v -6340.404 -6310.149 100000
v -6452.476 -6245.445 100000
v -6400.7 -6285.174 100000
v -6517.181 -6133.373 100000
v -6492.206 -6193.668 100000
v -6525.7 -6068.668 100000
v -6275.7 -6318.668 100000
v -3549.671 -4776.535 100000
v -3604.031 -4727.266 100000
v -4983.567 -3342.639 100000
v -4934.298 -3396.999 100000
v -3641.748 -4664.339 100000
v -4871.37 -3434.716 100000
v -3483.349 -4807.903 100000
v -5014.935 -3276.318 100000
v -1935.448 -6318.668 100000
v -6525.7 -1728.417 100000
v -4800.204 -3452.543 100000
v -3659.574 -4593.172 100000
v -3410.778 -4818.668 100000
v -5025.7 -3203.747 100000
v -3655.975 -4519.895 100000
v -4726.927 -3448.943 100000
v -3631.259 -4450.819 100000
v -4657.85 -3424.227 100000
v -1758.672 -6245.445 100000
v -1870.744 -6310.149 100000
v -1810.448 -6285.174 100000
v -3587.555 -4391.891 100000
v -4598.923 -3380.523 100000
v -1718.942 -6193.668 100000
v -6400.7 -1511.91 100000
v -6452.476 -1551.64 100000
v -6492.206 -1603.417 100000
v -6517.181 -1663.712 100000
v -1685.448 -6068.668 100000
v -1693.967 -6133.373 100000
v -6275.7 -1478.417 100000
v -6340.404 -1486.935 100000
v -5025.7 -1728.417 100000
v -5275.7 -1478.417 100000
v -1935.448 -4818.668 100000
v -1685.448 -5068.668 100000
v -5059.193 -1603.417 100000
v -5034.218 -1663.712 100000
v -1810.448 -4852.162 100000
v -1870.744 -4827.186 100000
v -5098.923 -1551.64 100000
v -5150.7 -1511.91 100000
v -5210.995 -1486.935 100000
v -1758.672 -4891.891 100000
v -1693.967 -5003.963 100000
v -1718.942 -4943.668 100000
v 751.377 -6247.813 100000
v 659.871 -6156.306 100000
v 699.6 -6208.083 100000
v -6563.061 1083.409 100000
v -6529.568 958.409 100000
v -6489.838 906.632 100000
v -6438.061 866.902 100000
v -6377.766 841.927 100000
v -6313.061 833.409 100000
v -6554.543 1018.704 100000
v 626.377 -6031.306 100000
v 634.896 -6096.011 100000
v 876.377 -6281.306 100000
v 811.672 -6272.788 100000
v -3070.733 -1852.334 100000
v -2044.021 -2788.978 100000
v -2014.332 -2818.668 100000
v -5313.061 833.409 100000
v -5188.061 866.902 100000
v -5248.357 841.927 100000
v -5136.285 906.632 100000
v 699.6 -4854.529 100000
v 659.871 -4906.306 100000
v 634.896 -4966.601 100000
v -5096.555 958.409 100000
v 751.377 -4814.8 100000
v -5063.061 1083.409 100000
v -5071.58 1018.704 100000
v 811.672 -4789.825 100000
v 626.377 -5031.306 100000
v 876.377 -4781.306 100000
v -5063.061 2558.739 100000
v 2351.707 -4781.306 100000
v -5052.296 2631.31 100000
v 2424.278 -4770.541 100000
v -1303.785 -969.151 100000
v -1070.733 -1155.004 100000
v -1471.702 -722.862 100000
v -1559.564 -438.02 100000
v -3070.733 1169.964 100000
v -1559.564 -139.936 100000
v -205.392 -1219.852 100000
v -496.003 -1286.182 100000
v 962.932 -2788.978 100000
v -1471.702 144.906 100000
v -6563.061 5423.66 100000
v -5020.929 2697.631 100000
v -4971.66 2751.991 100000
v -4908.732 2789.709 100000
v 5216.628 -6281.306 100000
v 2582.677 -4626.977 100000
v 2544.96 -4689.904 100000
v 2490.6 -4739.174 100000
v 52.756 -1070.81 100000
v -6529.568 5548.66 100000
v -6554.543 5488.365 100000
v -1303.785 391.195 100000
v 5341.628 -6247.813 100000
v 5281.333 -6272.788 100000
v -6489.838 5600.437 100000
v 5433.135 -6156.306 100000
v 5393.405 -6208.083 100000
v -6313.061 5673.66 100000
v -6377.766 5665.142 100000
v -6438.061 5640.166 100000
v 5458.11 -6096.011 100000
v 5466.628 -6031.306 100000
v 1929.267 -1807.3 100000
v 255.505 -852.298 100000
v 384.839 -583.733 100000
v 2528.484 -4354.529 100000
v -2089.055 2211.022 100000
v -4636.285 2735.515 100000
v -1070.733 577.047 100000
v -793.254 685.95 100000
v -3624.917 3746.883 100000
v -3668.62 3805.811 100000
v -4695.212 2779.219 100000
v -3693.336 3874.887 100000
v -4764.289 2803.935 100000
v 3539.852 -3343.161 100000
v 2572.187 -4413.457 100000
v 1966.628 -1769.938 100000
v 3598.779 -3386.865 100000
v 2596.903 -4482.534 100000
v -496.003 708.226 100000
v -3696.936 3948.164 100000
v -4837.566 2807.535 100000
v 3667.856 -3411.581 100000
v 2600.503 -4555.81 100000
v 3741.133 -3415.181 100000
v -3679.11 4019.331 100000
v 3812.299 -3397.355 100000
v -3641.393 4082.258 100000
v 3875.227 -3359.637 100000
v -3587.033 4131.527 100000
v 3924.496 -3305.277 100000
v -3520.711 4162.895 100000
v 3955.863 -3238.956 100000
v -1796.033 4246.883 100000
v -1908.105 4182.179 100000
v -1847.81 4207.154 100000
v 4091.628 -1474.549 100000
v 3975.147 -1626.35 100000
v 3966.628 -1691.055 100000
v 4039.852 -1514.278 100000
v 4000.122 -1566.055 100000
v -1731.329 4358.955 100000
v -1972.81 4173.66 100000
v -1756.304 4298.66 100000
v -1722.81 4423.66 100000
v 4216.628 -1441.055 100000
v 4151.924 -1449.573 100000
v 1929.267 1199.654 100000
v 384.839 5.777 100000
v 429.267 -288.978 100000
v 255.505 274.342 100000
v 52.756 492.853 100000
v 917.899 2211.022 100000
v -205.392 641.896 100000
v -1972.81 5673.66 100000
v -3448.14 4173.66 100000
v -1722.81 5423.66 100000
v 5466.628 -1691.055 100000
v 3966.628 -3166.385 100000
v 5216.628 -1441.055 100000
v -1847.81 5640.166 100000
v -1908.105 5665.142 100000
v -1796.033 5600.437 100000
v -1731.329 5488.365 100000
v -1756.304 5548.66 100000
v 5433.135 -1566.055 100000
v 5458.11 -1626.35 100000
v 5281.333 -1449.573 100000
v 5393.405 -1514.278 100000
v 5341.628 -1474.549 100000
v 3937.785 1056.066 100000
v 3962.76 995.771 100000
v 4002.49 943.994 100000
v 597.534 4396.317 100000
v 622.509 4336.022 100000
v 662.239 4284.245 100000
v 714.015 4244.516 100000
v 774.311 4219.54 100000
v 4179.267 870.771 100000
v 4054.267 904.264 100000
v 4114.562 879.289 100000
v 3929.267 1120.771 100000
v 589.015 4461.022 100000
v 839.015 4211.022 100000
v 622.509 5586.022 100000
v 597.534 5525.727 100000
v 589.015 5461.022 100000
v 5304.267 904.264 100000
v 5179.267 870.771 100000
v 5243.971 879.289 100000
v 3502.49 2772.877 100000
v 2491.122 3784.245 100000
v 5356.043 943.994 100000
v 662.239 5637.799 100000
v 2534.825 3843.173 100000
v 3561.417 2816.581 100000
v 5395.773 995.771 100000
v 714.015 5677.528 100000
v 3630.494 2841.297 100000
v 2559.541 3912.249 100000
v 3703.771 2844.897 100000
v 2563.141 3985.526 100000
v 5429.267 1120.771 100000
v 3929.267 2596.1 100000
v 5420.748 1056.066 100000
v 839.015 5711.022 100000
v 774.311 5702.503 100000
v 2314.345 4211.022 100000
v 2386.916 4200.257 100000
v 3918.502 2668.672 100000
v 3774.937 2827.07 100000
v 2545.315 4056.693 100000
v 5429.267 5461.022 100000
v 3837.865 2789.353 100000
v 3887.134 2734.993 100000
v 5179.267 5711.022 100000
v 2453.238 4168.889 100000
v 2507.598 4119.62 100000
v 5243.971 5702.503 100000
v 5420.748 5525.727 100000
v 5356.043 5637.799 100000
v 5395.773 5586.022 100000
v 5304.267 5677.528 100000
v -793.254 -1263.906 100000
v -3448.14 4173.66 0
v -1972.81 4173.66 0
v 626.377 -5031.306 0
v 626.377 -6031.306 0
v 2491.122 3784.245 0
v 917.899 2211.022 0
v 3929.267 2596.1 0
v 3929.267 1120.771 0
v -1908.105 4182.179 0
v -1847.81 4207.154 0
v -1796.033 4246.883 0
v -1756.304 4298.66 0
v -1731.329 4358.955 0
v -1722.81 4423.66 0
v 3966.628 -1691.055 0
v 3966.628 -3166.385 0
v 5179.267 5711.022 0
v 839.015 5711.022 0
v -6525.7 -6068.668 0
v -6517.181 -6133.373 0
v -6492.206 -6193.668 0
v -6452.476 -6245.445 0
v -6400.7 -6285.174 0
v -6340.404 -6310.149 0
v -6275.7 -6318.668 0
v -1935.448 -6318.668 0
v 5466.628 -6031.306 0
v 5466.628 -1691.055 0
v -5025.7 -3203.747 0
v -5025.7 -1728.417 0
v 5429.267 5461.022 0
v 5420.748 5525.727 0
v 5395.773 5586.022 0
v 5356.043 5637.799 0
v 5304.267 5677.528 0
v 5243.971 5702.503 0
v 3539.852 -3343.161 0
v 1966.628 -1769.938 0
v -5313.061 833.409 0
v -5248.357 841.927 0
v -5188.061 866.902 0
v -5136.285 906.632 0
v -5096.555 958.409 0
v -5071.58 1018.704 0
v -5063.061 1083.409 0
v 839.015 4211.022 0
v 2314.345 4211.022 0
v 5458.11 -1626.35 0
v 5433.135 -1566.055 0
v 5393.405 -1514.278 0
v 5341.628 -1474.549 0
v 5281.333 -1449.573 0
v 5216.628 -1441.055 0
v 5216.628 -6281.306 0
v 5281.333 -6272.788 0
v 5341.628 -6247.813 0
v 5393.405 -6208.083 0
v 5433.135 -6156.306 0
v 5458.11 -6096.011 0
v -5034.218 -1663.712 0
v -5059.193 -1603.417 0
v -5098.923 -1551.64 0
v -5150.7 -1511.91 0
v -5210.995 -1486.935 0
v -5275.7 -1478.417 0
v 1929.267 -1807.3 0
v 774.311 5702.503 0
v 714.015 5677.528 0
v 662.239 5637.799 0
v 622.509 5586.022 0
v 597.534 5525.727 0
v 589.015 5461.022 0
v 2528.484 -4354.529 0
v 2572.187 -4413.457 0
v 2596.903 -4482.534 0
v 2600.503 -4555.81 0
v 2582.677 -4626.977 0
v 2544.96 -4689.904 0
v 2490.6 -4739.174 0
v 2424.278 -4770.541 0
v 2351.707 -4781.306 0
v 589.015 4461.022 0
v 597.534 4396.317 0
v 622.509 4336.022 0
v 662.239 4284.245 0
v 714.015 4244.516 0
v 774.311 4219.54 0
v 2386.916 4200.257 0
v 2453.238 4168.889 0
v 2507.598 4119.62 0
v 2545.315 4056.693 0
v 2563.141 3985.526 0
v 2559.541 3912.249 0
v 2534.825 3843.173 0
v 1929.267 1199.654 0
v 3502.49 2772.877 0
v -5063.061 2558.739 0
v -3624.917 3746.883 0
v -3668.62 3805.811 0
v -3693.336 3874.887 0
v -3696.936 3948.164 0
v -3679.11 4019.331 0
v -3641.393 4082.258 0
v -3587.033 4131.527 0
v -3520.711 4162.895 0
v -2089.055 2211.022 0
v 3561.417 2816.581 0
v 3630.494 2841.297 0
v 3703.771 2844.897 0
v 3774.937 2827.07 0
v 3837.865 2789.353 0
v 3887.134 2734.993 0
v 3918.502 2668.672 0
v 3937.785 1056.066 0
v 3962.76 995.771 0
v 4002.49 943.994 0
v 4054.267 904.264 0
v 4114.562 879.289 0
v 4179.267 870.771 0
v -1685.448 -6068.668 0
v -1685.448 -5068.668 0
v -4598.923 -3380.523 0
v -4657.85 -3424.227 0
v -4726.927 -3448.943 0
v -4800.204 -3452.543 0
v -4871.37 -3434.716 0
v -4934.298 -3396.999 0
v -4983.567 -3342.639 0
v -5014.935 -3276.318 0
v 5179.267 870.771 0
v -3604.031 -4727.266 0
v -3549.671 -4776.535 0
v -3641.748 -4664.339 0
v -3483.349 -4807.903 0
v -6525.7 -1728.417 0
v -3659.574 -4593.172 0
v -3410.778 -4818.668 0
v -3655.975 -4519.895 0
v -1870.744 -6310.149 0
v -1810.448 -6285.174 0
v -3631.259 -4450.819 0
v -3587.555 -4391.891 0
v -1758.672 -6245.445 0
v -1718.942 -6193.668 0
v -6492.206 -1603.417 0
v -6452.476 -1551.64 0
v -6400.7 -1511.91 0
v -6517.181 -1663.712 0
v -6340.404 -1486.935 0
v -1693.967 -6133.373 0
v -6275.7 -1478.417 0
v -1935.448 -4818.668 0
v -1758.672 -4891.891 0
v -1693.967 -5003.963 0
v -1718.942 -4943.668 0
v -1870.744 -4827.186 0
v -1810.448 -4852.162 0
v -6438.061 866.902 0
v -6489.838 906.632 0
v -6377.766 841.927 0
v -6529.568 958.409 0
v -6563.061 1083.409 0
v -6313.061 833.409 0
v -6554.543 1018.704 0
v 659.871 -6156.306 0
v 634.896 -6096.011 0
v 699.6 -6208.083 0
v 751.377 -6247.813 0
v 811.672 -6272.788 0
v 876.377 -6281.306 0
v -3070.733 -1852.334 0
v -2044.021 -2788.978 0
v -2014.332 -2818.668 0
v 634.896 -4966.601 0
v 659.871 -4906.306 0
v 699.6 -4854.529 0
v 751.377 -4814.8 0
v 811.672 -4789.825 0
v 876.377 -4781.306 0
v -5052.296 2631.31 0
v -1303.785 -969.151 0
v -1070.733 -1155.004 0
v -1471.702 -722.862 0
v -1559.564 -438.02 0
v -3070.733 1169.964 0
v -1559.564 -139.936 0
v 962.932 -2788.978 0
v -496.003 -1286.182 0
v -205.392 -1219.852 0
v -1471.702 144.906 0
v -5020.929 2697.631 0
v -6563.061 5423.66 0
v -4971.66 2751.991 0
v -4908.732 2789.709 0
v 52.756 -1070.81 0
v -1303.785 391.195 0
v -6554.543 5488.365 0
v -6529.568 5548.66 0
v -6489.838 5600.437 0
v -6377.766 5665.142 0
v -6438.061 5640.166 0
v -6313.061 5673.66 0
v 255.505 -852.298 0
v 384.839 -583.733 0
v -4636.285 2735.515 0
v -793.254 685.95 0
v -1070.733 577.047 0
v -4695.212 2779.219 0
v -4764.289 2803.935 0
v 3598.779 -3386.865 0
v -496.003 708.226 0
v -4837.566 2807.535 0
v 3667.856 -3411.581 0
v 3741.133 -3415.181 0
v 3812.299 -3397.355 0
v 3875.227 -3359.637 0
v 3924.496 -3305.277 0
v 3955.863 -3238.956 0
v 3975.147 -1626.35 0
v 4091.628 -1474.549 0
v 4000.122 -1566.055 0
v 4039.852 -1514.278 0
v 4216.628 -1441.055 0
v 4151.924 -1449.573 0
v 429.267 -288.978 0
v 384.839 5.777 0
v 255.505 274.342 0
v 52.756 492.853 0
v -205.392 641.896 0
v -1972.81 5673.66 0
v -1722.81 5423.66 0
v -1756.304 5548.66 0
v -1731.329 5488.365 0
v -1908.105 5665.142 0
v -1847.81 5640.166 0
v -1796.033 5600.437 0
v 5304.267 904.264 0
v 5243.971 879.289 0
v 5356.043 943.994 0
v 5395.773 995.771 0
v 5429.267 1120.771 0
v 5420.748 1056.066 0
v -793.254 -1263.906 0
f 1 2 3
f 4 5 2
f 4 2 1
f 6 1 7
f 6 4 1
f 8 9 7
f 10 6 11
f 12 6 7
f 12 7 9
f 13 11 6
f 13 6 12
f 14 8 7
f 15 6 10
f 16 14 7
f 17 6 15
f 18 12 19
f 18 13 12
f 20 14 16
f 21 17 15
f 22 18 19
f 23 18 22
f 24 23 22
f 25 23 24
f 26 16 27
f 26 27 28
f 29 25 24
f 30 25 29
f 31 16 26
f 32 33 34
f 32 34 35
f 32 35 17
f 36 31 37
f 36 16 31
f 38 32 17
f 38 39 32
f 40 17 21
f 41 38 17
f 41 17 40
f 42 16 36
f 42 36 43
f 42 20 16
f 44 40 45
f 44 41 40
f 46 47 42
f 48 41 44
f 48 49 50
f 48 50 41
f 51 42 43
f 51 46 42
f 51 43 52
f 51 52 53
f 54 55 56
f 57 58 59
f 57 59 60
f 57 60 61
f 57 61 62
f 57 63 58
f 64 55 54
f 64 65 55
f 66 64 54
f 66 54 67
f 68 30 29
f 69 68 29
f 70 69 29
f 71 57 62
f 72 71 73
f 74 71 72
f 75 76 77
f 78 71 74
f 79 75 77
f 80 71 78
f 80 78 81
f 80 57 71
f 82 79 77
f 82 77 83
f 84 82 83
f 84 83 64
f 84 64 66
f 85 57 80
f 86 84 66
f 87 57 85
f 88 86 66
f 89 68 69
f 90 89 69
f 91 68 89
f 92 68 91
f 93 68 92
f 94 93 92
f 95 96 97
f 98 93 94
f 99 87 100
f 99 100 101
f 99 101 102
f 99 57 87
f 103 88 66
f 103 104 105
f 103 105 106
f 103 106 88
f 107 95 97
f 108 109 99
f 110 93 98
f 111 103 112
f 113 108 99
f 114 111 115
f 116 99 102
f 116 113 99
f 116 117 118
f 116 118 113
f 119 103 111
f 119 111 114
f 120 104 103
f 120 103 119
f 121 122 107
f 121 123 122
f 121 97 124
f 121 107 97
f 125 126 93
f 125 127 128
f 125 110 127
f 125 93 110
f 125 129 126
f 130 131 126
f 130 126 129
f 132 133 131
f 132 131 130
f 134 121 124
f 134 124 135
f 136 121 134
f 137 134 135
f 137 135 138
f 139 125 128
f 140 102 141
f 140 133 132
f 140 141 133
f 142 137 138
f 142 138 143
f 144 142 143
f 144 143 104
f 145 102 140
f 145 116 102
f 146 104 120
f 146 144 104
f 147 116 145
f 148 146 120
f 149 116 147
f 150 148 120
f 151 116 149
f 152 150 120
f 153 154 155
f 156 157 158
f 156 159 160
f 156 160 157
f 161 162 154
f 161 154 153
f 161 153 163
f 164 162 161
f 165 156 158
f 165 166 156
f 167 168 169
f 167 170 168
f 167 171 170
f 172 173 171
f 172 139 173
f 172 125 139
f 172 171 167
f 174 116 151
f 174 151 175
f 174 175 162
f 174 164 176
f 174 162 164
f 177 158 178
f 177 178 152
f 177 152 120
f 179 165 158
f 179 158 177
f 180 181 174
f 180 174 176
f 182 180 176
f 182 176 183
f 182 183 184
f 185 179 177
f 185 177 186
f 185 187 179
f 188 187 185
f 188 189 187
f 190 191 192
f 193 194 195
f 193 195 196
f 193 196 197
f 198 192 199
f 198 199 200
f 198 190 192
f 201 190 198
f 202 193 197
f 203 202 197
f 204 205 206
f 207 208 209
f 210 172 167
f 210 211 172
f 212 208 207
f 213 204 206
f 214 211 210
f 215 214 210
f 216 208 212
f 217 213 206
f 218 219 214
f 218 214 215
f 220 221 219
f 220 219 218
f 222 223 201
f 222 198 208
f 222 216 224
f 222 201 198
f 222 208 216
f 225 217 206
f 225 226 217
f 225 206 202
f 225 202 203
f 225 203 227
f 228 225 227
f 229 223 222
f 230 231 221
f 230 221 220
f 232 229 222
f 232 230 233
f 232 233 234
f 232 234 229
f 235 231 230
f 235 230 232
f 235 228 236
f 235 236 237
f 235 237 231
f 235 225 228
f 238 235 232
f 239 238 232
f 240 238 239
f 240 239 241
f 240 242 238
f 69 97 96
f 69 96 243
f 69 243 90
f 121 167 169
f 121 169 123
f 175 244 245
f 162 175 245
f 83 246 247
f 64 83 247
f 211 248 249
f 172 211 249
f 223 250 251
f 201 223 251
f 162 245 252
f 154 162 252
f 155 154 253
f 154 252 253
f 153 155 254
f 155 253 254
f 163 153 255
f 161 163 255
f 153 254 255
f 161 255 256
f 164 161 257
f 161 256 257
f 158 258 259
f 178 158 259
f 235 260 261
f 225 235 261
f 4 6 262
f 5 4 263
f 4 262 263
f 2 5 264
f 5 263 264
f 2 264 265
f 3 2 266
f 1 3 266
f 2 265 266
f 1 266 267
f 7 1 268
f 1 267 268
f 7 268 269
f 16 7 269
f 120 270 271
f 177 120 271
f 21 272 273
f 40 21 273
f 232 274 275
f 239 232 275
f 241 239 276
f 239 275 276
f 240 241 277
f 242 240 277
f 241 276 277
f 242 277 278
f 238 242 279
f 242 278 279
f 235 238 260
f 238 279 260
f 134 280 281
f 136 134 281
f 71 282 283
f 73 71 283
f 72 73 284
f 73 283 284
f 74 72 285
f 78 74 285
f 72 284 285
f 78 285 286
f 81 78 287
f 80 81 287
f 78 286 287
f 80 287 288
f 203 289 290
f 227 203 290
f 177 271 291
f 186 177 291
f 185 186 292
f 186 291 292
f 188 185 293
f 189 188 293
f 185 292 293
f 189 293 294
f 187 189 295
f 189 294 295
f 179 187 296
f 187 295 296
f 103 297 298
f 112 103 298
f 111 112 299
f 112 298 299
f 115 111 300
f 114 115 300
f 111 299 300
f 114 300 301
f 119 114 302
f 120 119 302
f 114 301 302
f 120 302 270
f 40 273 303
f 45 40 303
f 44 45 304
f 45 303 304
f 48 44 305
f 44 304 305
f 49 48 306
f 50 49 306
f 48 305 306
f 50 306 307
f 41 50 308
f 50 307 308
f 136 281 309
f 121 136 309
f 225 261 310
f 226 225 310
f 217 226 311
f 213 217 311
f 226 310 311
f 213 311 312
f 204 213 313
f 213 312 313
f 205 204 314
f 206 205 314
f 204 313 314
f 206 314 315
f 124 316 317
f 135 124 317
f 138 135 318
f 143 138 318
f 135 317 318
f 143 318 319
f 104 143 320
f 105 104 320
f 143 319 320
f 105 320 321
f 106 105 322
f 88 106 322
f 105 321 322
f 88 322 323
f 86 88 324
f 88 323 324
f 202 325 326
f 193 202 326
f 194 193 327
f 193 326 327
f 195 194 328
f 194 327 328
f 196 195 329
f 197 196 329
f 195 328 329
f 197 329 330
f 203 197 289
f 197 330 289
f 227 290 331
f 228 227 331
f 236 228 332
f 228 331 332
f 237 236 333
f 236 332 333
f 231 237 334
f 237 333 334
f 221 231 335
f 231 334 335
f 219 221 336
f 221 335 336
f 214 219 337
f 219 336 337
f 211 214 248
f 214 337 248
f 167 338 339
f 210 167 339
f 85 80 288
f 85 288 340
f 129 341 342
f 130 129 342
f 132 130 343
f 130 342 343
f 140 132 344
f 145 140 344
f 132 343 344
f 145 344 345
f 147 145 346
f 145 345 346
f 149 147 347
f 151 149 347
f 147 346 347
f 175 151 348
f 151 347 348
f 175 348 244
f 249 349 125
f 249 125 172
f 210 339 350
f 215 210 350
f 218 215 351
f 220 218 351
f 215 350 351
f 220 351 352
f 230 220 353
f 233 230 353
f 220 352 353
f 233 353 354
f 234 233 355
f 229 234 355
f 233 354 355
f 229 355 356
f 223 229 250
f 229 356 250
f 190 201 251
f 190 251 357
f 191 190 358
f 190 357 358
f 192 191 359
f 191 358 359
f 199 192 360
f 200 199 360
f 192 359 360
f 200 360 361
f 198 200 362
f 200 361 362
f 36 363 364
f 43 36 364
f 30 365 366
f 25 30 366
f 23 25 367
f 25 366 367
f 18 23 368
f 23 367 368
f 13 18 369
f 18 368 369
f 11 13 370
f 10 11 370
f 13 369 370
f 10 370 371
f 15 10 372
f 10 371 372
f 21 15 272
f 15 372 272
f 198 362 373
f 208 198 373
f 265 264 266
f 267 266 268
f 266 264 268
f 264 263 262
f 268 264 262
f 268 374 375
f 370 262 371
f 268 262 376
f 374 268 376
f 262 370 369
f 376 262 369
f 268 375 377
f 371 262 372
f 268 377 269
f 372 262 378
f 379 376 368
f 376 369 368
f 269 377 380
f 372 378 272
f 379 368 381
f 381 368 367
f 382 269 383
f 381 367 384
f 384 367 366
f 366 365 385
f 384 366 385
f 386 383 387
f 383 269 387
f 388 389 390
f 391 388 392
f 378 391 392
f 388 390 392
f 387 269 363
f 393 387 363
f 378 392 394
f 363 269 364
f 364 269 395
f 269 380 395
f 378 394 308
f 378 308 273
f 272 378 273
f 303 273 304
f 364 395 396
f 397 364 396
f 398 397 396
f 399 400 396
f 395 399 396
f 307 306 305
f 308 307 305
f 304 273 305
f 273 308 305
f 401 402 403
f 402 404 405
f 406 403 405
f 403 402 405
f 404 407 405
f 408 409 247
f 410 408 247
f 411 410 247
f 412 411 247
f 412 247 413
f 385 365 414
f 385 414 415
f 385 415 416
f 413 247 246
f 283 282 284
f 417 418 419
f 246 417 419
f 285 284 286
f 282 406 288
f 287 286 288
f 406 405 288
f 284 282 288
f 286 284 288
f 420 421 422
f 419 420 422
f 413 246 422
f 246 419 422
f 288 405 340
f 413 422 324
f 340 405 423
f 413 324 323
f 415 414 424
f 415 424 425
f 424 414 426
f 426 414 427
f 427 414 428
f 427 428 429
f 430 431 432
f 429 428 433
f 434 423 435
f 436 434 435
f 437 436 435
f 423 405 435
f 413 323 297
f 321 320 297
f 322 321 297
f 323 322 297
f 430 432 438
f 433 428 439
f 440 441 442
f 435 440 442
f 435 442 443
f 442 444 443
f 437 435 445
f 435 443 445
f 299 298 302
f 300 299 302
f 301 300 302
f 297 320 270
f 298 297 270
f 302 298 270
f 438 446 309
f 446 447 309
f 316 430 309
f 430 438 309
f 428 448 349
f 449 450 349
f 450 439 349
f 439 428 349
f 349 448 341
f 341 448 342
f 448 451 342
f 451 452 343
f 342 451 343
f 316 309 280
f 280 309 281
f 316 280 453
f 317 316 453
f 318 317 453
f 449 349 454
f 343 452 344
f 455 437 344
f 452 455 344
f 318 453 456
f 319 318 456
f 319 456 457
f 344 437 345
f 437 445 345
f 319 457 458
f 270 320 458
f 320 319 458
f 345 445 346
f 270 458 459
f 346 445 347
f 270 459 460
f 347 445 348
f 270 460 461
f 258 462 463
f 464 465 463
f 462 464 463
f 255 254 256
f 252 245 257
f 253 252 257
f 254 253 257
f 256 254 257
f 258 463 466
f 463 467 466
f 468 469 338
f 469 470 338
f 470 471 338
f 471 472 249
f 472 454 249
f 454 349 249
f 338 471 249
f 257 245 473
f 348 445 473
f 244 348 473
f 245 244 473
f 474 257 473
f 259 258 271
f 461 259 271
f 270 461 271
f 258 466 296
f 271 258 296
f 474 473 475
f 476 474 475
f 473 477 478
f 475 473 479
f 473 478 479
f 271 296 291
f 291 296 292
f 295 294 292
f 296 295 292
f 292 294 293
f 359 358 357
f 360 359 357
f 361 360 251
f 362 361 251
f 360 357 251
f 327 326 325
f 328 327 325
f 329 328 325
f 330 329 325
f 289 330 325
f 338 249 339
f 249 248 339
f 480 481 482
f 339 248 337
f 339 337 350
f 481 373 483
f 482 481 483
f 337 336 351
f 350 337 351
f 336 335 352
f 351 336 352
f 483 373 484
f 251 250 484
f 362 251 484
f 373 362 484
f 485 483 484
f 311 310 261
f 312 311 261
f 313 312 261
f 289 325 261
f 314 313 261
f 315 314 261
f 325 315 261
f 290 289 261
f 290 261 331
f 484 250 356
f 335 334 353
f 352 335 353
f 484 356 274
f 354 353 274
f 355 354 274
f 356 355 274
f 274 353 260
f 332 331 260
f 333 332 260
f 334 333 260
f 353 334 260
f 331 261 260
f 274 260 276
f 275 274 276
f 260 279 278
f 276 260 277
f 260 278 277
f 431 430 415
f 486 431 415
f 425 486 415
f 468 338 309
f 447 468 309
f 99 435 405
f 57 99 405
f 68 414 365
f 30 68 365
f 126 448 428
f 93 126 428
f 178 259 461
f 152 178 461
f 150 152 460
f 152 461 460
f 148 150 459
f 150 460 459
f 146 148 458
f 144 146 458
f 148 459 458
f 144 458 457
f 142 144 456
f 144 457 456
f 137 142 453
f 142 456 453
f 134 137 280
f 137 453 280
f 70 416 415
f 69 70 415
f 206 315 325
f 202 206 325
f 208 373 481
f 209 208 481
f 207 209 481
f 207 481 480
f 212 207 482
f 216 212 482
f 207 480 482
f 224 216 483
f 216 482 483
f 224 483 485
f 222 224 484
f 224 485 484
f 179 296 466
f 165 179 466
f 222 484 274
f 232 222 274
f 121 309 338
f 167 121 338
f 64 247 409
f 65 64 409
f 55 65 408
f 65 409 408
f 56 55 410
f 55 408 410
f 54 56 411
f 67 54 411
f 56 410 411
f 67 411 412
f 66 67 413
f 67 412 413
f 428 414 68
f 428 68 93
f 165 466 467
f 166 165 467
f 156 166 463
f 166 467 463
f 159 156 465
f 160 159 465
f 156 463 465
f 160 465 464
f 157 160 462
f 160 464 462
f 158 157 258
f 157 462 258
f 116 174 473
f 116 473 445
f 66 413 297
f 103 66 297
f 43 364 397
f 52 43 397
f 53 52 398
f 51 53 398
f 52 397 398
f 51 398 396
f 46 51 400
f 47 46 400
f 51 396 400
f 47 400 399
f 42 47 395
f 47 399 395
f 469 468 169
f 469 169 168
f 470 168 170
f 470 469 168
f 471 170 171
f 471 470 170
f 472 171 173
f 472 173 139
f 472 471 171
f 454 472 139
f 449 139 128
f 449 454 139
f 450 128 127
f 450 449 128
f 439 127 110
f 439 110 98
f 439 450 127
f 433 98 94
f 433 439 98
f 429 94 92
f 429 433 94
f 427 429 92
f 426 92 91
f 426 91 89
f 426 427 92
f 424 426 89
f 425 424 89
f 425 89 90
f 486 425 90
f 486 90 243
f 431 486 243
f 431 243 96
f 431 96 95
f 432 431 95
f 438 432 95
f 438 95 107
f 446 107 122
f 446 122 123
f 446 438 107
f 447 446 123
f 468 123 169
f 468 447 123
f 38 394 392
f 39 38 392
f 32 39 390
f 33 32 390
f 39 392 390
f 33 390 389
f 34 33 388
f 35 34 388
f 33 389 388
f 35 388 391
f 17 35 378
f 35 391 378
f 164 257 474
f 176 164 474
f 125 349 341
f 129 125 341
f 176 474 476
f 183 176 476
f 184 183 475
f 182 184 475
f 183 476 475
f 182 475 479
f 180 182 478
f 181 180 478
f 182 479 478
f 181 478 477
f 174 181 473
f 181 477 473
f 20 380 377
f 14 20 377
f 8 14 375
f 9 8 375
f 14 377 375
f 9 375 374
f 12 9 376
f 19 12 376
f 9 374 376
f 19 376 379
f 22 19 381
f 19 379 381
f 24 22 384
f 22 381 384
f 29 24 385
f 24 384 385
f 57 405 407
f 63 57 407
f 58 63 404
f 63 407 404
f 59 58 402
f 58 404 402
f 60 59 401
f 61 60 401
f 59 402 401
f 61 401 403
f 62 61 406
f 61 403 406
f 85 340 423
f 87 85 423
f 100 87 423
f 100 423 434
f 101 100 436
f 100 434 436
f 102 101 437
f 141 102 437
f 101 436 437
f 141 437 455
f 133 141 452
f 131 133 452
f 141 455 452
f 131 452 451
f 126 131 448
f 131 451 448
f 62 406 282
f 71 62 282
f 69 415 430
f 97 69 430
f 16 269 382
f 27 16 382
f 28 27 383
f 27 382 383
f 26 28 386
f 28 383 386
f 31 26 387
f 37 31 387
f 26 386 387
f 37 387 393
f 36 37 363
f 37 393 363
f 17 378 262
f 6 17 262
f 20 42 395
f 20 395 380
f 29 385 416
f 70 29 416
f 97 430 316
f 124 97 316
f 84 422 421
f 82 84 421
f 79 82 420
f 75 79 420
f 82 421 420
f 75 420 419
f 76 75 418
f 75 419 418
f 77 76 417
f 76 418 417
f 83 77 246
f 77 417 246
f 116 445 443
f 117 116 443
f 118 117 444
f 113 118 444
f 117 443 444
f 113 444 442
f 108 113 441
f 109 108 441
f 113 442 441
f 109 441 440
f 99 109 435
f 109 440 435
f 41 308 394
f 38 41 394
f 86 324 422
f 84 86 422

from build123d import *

# Parameters (mm, degrees)
SKETCH1_W           = 5000
SKETCH1_H           = 5000
SKETCH1_R           = 1000
BOSS_EXTRUDE1_DEPTH = 100000


with BuildPart() as part:
    # Sketch1 → Boss-Extrude1 (new body)
    # profile 1 of 5: a face of its own
    with BuildSketch(Plane.XY):
        with Locations((-570.733388509, -288.978142377)):
            Rectangle(SKETCH1_W, SKETCH1_H)
        with Locations((-570.733388509, -288.978142377)):
            Circle(SKETCH1_R, mode=Mode.SUBTRACT)
    # profile 2 of 5: a face of its own
    with BuildSketch(Plane.XY):
        with BuildLine():
            Line((5429.266611491, 1120.770586579), (5429.266611491, 5461.021857623))
            ThreePointArc((5429.266611491, 5461.021857623), (5356.043306787, 5637.79855292), (5179.266611491, 5711.021857623))
            Line((5179.266611491, 5711.021857623), (839.015340447, 5711.021857623))
            ThreePointArc((839.015340447, 5711.021857623), (662.23864515, 5637.79855292), (589.015340447, 5461.021857623))
            Line((589.015340447, 5461.021857623), (589.015340447, 4461.021857623))
            ThreePointArc((589.015340447, 4461.021857623), (662.23864515, 4284.245162327), (839.015340447, 4211.021857623))
            Line((839.015340447, 4211.021857623), (2314.345172446, 4211.021857623))
            ThreePointArc((2314.345172446, 4211.021857623), (2545.315055574, 4056.692715715), (2491.121867743, 3784.245162327))
            Line((2491.121867743, 3784.245162327), (917.89856304, 2211.021857623))
            Line((917.89856304, 2211.021857623), (1929.266611491, 1199.653809172))
            Line((1929.266611491, 1199.653809172), (3502.489916194, 2772.877113876))
            ThreePointArc((3502.489916194, 2772.877113876), (3774.937469582, 2827.070301707), (3929.266611491, 2596.100418579))
            Line((3929.266611491, 2596.100418579), (3929.266611491, 1120.770586579))
            ThreePointArc((3929.266611491, 1120.770586579), (4002.489916194, 943.993891283), (4179.266611491, 870.770586579))
            Line((4179.266611491, 870.770586579), (5179.266611491, 870.770586579))
            ThreePointArc((5179.266611491, 870.770586579), (5356.043306787, 943.993891283), (5429.266611491, 1120.770586579))
        make_face()
    # profile 3 of 5: a face of its own
    with BuildSketch(Plane.XY):
        with BuildLine():
            Line((1966.628399523, -1769.938118418), (955.260351072, -2781.306166869))
            Line((955.260351072, -2781.306166869), (2528.483655775, -4354.529471572))
            ThreePointArc((2528.483655775, -4354.529471572), (2582.676843606, -4626.97702496), (2351.706960478, -4781.306166869))
            Line((2351.706960478, -4781.306166869), (876.377128479, -4781.306166869))
            ThreePointArc((876.377128479, -4781.306166869), (699.600433182, -4854.529471572), (626.377128479, -5031.306166869))
            Line((626.377128479, -5031.306166869), (626.377128479, -6031.306166869))
            ThreePointArc((626.377128479, -6031.306166869), (699.600433182, -6208.082862166), (876.377128479, -6281.306166869))
            Line((876.377128479, -6281.306166869), (5216.628399523, -6281.306166869))
            ThreePointArc((5216.628399523, -6281.306166869), (5393.405094819, -6208.082862166), (5466.628399523, -6031.306166869))
            Line((5466.628399523, -6031.306166869), (5466.628399523, -1691.054895825))
            ThreePointArc((5466.628399523, -1691.054895825), (5393.405094819, -1514.278200528), (5216.628399523, -1441.054895825))
            Line((5216.628399523, -1441.054895825), (4216.628399523, -1441.054895825))
            ThreePointArc((4216.628399523, -1441.054895825), (4039.851704226, -1514.278200528), (3966.628399523, -1691.054895825))
            Line((3966.628399523, -1691.054895825), (3966.628399523, -3166.384727824))
            ThreePointArc((3966.628399523, -3166.384727824), (3812.299257614, -3397.354610952), (3539.851704226, -3343.161423121))
            Line((3539.851704226, -3343.161423121), (1966.628399523, -1769.938118418))
        make_face()
    # profile 4 of 5: a face of its own
    with BuildSketch(Plane.XY):
        with BuildLine():
            Line((-2014.331576518, -2818.667954901), (-3025.69962497, -1807.29990645))
            Line((-3025.69962497, -1807.29990645), (-4598.922929673, -3380.523211153))
            ThreePointArc((-4598.922929673, -3380.523211153), (-4871.370483061, -3434.716398984), (-5025.699624969, -3203.746515856))
            Line((-5025.699624969, -3203.746515856), (-5025.699624969, -1728.416683857))
            ThreePointArc((-5025.699624969, -1728.416683857), (-5098.922929673, -1551.63998856), (-5275.699624969, -1478.416683857))
            Line((-5275.699624969, -1478.416683857), (-6275.699624969, -1478.416683857))
            ThreePointArc((-6275.699624969, -1478.416683857), (-6452.476320266, -1551.63998856), (-6525.699624969, -1728.416683857))
            Line((-6525.699624969, -1728.416683857), (-6525.699624969, -6068.667954901))
            ThreePointArc((-6525.699624969, -6068.667954901), (-6452.476320266, -6245.444650198), (-6275.699624969, -6318.667954901))
            Line((-6275.699624969, -6318.667954901), (-1935.448353925, -6318.667954901))
            ThreePointArc((-1935.448353925, -6318.667954901), (-1758.671658629, -6245.444650198), (-1685.448353925, -6068.667954901))
            Line((-1685.448353925, -6068.667954901), (-1685.448353925, -5068.667954901))
            ThreePointArc((-1685.448353925, -5068.667954901), (-1758.671658629, -4891.891259604), (-1935.448353925, -4818.667954901))
            Line((-1935.448353925, -4818.667954901), (-3410.778185925, -4818.667954901))
            ThreePointArc((-3410.778185925, -4818.667954901), (-3641.748069053, -4664.338812992), (-3587.554881222, -4391.891259604))
            Line((-3587.554881222, -4391.891259604), (-2014.331576518, -2818.667954901))
        make_face()
    # profile 5 of 5: a face of its own
    with BuildSketch(Plane.XY):
        with BuildLine():
            Line((-3063.061413001, 1162.29202114), (-2051.69336455, 2173.660069591))
            Line((-2051.69336455, 2173.660069591), (-3624.916669254, 3746.883374295))
            ThreePointArc((-3624.916669254, 3746.883374295), (-3679.109857085, 4019.330927683), (-3448.139973957, 4173.660069591))
            Line((-3448.139973957, 4173.660069591), (-1972.810141957, 4173.660069591))
            ThreePointArc((-1972.810141957, 4173.660069591), (-1796.033446661, 4246.883374295), (-1722.810141957, 4423.660069591))
            Line((-1722.810141957, 4423.660069591), (-1722.810141957, 5423.660069591))
            ThreePointArc((-1722.810141957, 5423.660069591), (-1796.033446661, 5600.436764888), (-1972.810141957, 5673.660069591))
            Line((-1972.810141957, 5673.660069591), (-6313.061413002, 5673.660069591))
            ThreePointArc((-6313.061413002, 5673.660069591), (-6489.838108298, 5600.436764888), (-6563.061413002, 5423.660069591))
            Line((-6563.061413002, 5423.660069591), (-6563.061413002, 1083.408798547))
            ThreePointArc((-6563.061413002, 1083.408798547), (-6489.838108298, 906.632103251), (-6313.061413002, 833.408798547))
            Line((-6313.061413002, 833.408798547), (-5313.061413002, 833.408798547))
            ThreePointArc((-5313.061413002, 833.408798547), (-5136.284717705, 906.632103251), (-5063.061413002, 1083.408798547))
            Line((-5063.061413002, 1083.408798547), (-5063.061413002, 2558.738630547))
            ThreePointArc((-5063.061413002, 2558.738630547), (-4908.732271093, 2789.708513675), (-4636.284717705, 2735.515325844))
            Line((-4636.284717705, 2735.515325844), (-3063.061413001, 1162.29202114))
        make_face()
    extrude(amount=BOSS_EXTRUDE1_DEPTH)


solid = part.part
